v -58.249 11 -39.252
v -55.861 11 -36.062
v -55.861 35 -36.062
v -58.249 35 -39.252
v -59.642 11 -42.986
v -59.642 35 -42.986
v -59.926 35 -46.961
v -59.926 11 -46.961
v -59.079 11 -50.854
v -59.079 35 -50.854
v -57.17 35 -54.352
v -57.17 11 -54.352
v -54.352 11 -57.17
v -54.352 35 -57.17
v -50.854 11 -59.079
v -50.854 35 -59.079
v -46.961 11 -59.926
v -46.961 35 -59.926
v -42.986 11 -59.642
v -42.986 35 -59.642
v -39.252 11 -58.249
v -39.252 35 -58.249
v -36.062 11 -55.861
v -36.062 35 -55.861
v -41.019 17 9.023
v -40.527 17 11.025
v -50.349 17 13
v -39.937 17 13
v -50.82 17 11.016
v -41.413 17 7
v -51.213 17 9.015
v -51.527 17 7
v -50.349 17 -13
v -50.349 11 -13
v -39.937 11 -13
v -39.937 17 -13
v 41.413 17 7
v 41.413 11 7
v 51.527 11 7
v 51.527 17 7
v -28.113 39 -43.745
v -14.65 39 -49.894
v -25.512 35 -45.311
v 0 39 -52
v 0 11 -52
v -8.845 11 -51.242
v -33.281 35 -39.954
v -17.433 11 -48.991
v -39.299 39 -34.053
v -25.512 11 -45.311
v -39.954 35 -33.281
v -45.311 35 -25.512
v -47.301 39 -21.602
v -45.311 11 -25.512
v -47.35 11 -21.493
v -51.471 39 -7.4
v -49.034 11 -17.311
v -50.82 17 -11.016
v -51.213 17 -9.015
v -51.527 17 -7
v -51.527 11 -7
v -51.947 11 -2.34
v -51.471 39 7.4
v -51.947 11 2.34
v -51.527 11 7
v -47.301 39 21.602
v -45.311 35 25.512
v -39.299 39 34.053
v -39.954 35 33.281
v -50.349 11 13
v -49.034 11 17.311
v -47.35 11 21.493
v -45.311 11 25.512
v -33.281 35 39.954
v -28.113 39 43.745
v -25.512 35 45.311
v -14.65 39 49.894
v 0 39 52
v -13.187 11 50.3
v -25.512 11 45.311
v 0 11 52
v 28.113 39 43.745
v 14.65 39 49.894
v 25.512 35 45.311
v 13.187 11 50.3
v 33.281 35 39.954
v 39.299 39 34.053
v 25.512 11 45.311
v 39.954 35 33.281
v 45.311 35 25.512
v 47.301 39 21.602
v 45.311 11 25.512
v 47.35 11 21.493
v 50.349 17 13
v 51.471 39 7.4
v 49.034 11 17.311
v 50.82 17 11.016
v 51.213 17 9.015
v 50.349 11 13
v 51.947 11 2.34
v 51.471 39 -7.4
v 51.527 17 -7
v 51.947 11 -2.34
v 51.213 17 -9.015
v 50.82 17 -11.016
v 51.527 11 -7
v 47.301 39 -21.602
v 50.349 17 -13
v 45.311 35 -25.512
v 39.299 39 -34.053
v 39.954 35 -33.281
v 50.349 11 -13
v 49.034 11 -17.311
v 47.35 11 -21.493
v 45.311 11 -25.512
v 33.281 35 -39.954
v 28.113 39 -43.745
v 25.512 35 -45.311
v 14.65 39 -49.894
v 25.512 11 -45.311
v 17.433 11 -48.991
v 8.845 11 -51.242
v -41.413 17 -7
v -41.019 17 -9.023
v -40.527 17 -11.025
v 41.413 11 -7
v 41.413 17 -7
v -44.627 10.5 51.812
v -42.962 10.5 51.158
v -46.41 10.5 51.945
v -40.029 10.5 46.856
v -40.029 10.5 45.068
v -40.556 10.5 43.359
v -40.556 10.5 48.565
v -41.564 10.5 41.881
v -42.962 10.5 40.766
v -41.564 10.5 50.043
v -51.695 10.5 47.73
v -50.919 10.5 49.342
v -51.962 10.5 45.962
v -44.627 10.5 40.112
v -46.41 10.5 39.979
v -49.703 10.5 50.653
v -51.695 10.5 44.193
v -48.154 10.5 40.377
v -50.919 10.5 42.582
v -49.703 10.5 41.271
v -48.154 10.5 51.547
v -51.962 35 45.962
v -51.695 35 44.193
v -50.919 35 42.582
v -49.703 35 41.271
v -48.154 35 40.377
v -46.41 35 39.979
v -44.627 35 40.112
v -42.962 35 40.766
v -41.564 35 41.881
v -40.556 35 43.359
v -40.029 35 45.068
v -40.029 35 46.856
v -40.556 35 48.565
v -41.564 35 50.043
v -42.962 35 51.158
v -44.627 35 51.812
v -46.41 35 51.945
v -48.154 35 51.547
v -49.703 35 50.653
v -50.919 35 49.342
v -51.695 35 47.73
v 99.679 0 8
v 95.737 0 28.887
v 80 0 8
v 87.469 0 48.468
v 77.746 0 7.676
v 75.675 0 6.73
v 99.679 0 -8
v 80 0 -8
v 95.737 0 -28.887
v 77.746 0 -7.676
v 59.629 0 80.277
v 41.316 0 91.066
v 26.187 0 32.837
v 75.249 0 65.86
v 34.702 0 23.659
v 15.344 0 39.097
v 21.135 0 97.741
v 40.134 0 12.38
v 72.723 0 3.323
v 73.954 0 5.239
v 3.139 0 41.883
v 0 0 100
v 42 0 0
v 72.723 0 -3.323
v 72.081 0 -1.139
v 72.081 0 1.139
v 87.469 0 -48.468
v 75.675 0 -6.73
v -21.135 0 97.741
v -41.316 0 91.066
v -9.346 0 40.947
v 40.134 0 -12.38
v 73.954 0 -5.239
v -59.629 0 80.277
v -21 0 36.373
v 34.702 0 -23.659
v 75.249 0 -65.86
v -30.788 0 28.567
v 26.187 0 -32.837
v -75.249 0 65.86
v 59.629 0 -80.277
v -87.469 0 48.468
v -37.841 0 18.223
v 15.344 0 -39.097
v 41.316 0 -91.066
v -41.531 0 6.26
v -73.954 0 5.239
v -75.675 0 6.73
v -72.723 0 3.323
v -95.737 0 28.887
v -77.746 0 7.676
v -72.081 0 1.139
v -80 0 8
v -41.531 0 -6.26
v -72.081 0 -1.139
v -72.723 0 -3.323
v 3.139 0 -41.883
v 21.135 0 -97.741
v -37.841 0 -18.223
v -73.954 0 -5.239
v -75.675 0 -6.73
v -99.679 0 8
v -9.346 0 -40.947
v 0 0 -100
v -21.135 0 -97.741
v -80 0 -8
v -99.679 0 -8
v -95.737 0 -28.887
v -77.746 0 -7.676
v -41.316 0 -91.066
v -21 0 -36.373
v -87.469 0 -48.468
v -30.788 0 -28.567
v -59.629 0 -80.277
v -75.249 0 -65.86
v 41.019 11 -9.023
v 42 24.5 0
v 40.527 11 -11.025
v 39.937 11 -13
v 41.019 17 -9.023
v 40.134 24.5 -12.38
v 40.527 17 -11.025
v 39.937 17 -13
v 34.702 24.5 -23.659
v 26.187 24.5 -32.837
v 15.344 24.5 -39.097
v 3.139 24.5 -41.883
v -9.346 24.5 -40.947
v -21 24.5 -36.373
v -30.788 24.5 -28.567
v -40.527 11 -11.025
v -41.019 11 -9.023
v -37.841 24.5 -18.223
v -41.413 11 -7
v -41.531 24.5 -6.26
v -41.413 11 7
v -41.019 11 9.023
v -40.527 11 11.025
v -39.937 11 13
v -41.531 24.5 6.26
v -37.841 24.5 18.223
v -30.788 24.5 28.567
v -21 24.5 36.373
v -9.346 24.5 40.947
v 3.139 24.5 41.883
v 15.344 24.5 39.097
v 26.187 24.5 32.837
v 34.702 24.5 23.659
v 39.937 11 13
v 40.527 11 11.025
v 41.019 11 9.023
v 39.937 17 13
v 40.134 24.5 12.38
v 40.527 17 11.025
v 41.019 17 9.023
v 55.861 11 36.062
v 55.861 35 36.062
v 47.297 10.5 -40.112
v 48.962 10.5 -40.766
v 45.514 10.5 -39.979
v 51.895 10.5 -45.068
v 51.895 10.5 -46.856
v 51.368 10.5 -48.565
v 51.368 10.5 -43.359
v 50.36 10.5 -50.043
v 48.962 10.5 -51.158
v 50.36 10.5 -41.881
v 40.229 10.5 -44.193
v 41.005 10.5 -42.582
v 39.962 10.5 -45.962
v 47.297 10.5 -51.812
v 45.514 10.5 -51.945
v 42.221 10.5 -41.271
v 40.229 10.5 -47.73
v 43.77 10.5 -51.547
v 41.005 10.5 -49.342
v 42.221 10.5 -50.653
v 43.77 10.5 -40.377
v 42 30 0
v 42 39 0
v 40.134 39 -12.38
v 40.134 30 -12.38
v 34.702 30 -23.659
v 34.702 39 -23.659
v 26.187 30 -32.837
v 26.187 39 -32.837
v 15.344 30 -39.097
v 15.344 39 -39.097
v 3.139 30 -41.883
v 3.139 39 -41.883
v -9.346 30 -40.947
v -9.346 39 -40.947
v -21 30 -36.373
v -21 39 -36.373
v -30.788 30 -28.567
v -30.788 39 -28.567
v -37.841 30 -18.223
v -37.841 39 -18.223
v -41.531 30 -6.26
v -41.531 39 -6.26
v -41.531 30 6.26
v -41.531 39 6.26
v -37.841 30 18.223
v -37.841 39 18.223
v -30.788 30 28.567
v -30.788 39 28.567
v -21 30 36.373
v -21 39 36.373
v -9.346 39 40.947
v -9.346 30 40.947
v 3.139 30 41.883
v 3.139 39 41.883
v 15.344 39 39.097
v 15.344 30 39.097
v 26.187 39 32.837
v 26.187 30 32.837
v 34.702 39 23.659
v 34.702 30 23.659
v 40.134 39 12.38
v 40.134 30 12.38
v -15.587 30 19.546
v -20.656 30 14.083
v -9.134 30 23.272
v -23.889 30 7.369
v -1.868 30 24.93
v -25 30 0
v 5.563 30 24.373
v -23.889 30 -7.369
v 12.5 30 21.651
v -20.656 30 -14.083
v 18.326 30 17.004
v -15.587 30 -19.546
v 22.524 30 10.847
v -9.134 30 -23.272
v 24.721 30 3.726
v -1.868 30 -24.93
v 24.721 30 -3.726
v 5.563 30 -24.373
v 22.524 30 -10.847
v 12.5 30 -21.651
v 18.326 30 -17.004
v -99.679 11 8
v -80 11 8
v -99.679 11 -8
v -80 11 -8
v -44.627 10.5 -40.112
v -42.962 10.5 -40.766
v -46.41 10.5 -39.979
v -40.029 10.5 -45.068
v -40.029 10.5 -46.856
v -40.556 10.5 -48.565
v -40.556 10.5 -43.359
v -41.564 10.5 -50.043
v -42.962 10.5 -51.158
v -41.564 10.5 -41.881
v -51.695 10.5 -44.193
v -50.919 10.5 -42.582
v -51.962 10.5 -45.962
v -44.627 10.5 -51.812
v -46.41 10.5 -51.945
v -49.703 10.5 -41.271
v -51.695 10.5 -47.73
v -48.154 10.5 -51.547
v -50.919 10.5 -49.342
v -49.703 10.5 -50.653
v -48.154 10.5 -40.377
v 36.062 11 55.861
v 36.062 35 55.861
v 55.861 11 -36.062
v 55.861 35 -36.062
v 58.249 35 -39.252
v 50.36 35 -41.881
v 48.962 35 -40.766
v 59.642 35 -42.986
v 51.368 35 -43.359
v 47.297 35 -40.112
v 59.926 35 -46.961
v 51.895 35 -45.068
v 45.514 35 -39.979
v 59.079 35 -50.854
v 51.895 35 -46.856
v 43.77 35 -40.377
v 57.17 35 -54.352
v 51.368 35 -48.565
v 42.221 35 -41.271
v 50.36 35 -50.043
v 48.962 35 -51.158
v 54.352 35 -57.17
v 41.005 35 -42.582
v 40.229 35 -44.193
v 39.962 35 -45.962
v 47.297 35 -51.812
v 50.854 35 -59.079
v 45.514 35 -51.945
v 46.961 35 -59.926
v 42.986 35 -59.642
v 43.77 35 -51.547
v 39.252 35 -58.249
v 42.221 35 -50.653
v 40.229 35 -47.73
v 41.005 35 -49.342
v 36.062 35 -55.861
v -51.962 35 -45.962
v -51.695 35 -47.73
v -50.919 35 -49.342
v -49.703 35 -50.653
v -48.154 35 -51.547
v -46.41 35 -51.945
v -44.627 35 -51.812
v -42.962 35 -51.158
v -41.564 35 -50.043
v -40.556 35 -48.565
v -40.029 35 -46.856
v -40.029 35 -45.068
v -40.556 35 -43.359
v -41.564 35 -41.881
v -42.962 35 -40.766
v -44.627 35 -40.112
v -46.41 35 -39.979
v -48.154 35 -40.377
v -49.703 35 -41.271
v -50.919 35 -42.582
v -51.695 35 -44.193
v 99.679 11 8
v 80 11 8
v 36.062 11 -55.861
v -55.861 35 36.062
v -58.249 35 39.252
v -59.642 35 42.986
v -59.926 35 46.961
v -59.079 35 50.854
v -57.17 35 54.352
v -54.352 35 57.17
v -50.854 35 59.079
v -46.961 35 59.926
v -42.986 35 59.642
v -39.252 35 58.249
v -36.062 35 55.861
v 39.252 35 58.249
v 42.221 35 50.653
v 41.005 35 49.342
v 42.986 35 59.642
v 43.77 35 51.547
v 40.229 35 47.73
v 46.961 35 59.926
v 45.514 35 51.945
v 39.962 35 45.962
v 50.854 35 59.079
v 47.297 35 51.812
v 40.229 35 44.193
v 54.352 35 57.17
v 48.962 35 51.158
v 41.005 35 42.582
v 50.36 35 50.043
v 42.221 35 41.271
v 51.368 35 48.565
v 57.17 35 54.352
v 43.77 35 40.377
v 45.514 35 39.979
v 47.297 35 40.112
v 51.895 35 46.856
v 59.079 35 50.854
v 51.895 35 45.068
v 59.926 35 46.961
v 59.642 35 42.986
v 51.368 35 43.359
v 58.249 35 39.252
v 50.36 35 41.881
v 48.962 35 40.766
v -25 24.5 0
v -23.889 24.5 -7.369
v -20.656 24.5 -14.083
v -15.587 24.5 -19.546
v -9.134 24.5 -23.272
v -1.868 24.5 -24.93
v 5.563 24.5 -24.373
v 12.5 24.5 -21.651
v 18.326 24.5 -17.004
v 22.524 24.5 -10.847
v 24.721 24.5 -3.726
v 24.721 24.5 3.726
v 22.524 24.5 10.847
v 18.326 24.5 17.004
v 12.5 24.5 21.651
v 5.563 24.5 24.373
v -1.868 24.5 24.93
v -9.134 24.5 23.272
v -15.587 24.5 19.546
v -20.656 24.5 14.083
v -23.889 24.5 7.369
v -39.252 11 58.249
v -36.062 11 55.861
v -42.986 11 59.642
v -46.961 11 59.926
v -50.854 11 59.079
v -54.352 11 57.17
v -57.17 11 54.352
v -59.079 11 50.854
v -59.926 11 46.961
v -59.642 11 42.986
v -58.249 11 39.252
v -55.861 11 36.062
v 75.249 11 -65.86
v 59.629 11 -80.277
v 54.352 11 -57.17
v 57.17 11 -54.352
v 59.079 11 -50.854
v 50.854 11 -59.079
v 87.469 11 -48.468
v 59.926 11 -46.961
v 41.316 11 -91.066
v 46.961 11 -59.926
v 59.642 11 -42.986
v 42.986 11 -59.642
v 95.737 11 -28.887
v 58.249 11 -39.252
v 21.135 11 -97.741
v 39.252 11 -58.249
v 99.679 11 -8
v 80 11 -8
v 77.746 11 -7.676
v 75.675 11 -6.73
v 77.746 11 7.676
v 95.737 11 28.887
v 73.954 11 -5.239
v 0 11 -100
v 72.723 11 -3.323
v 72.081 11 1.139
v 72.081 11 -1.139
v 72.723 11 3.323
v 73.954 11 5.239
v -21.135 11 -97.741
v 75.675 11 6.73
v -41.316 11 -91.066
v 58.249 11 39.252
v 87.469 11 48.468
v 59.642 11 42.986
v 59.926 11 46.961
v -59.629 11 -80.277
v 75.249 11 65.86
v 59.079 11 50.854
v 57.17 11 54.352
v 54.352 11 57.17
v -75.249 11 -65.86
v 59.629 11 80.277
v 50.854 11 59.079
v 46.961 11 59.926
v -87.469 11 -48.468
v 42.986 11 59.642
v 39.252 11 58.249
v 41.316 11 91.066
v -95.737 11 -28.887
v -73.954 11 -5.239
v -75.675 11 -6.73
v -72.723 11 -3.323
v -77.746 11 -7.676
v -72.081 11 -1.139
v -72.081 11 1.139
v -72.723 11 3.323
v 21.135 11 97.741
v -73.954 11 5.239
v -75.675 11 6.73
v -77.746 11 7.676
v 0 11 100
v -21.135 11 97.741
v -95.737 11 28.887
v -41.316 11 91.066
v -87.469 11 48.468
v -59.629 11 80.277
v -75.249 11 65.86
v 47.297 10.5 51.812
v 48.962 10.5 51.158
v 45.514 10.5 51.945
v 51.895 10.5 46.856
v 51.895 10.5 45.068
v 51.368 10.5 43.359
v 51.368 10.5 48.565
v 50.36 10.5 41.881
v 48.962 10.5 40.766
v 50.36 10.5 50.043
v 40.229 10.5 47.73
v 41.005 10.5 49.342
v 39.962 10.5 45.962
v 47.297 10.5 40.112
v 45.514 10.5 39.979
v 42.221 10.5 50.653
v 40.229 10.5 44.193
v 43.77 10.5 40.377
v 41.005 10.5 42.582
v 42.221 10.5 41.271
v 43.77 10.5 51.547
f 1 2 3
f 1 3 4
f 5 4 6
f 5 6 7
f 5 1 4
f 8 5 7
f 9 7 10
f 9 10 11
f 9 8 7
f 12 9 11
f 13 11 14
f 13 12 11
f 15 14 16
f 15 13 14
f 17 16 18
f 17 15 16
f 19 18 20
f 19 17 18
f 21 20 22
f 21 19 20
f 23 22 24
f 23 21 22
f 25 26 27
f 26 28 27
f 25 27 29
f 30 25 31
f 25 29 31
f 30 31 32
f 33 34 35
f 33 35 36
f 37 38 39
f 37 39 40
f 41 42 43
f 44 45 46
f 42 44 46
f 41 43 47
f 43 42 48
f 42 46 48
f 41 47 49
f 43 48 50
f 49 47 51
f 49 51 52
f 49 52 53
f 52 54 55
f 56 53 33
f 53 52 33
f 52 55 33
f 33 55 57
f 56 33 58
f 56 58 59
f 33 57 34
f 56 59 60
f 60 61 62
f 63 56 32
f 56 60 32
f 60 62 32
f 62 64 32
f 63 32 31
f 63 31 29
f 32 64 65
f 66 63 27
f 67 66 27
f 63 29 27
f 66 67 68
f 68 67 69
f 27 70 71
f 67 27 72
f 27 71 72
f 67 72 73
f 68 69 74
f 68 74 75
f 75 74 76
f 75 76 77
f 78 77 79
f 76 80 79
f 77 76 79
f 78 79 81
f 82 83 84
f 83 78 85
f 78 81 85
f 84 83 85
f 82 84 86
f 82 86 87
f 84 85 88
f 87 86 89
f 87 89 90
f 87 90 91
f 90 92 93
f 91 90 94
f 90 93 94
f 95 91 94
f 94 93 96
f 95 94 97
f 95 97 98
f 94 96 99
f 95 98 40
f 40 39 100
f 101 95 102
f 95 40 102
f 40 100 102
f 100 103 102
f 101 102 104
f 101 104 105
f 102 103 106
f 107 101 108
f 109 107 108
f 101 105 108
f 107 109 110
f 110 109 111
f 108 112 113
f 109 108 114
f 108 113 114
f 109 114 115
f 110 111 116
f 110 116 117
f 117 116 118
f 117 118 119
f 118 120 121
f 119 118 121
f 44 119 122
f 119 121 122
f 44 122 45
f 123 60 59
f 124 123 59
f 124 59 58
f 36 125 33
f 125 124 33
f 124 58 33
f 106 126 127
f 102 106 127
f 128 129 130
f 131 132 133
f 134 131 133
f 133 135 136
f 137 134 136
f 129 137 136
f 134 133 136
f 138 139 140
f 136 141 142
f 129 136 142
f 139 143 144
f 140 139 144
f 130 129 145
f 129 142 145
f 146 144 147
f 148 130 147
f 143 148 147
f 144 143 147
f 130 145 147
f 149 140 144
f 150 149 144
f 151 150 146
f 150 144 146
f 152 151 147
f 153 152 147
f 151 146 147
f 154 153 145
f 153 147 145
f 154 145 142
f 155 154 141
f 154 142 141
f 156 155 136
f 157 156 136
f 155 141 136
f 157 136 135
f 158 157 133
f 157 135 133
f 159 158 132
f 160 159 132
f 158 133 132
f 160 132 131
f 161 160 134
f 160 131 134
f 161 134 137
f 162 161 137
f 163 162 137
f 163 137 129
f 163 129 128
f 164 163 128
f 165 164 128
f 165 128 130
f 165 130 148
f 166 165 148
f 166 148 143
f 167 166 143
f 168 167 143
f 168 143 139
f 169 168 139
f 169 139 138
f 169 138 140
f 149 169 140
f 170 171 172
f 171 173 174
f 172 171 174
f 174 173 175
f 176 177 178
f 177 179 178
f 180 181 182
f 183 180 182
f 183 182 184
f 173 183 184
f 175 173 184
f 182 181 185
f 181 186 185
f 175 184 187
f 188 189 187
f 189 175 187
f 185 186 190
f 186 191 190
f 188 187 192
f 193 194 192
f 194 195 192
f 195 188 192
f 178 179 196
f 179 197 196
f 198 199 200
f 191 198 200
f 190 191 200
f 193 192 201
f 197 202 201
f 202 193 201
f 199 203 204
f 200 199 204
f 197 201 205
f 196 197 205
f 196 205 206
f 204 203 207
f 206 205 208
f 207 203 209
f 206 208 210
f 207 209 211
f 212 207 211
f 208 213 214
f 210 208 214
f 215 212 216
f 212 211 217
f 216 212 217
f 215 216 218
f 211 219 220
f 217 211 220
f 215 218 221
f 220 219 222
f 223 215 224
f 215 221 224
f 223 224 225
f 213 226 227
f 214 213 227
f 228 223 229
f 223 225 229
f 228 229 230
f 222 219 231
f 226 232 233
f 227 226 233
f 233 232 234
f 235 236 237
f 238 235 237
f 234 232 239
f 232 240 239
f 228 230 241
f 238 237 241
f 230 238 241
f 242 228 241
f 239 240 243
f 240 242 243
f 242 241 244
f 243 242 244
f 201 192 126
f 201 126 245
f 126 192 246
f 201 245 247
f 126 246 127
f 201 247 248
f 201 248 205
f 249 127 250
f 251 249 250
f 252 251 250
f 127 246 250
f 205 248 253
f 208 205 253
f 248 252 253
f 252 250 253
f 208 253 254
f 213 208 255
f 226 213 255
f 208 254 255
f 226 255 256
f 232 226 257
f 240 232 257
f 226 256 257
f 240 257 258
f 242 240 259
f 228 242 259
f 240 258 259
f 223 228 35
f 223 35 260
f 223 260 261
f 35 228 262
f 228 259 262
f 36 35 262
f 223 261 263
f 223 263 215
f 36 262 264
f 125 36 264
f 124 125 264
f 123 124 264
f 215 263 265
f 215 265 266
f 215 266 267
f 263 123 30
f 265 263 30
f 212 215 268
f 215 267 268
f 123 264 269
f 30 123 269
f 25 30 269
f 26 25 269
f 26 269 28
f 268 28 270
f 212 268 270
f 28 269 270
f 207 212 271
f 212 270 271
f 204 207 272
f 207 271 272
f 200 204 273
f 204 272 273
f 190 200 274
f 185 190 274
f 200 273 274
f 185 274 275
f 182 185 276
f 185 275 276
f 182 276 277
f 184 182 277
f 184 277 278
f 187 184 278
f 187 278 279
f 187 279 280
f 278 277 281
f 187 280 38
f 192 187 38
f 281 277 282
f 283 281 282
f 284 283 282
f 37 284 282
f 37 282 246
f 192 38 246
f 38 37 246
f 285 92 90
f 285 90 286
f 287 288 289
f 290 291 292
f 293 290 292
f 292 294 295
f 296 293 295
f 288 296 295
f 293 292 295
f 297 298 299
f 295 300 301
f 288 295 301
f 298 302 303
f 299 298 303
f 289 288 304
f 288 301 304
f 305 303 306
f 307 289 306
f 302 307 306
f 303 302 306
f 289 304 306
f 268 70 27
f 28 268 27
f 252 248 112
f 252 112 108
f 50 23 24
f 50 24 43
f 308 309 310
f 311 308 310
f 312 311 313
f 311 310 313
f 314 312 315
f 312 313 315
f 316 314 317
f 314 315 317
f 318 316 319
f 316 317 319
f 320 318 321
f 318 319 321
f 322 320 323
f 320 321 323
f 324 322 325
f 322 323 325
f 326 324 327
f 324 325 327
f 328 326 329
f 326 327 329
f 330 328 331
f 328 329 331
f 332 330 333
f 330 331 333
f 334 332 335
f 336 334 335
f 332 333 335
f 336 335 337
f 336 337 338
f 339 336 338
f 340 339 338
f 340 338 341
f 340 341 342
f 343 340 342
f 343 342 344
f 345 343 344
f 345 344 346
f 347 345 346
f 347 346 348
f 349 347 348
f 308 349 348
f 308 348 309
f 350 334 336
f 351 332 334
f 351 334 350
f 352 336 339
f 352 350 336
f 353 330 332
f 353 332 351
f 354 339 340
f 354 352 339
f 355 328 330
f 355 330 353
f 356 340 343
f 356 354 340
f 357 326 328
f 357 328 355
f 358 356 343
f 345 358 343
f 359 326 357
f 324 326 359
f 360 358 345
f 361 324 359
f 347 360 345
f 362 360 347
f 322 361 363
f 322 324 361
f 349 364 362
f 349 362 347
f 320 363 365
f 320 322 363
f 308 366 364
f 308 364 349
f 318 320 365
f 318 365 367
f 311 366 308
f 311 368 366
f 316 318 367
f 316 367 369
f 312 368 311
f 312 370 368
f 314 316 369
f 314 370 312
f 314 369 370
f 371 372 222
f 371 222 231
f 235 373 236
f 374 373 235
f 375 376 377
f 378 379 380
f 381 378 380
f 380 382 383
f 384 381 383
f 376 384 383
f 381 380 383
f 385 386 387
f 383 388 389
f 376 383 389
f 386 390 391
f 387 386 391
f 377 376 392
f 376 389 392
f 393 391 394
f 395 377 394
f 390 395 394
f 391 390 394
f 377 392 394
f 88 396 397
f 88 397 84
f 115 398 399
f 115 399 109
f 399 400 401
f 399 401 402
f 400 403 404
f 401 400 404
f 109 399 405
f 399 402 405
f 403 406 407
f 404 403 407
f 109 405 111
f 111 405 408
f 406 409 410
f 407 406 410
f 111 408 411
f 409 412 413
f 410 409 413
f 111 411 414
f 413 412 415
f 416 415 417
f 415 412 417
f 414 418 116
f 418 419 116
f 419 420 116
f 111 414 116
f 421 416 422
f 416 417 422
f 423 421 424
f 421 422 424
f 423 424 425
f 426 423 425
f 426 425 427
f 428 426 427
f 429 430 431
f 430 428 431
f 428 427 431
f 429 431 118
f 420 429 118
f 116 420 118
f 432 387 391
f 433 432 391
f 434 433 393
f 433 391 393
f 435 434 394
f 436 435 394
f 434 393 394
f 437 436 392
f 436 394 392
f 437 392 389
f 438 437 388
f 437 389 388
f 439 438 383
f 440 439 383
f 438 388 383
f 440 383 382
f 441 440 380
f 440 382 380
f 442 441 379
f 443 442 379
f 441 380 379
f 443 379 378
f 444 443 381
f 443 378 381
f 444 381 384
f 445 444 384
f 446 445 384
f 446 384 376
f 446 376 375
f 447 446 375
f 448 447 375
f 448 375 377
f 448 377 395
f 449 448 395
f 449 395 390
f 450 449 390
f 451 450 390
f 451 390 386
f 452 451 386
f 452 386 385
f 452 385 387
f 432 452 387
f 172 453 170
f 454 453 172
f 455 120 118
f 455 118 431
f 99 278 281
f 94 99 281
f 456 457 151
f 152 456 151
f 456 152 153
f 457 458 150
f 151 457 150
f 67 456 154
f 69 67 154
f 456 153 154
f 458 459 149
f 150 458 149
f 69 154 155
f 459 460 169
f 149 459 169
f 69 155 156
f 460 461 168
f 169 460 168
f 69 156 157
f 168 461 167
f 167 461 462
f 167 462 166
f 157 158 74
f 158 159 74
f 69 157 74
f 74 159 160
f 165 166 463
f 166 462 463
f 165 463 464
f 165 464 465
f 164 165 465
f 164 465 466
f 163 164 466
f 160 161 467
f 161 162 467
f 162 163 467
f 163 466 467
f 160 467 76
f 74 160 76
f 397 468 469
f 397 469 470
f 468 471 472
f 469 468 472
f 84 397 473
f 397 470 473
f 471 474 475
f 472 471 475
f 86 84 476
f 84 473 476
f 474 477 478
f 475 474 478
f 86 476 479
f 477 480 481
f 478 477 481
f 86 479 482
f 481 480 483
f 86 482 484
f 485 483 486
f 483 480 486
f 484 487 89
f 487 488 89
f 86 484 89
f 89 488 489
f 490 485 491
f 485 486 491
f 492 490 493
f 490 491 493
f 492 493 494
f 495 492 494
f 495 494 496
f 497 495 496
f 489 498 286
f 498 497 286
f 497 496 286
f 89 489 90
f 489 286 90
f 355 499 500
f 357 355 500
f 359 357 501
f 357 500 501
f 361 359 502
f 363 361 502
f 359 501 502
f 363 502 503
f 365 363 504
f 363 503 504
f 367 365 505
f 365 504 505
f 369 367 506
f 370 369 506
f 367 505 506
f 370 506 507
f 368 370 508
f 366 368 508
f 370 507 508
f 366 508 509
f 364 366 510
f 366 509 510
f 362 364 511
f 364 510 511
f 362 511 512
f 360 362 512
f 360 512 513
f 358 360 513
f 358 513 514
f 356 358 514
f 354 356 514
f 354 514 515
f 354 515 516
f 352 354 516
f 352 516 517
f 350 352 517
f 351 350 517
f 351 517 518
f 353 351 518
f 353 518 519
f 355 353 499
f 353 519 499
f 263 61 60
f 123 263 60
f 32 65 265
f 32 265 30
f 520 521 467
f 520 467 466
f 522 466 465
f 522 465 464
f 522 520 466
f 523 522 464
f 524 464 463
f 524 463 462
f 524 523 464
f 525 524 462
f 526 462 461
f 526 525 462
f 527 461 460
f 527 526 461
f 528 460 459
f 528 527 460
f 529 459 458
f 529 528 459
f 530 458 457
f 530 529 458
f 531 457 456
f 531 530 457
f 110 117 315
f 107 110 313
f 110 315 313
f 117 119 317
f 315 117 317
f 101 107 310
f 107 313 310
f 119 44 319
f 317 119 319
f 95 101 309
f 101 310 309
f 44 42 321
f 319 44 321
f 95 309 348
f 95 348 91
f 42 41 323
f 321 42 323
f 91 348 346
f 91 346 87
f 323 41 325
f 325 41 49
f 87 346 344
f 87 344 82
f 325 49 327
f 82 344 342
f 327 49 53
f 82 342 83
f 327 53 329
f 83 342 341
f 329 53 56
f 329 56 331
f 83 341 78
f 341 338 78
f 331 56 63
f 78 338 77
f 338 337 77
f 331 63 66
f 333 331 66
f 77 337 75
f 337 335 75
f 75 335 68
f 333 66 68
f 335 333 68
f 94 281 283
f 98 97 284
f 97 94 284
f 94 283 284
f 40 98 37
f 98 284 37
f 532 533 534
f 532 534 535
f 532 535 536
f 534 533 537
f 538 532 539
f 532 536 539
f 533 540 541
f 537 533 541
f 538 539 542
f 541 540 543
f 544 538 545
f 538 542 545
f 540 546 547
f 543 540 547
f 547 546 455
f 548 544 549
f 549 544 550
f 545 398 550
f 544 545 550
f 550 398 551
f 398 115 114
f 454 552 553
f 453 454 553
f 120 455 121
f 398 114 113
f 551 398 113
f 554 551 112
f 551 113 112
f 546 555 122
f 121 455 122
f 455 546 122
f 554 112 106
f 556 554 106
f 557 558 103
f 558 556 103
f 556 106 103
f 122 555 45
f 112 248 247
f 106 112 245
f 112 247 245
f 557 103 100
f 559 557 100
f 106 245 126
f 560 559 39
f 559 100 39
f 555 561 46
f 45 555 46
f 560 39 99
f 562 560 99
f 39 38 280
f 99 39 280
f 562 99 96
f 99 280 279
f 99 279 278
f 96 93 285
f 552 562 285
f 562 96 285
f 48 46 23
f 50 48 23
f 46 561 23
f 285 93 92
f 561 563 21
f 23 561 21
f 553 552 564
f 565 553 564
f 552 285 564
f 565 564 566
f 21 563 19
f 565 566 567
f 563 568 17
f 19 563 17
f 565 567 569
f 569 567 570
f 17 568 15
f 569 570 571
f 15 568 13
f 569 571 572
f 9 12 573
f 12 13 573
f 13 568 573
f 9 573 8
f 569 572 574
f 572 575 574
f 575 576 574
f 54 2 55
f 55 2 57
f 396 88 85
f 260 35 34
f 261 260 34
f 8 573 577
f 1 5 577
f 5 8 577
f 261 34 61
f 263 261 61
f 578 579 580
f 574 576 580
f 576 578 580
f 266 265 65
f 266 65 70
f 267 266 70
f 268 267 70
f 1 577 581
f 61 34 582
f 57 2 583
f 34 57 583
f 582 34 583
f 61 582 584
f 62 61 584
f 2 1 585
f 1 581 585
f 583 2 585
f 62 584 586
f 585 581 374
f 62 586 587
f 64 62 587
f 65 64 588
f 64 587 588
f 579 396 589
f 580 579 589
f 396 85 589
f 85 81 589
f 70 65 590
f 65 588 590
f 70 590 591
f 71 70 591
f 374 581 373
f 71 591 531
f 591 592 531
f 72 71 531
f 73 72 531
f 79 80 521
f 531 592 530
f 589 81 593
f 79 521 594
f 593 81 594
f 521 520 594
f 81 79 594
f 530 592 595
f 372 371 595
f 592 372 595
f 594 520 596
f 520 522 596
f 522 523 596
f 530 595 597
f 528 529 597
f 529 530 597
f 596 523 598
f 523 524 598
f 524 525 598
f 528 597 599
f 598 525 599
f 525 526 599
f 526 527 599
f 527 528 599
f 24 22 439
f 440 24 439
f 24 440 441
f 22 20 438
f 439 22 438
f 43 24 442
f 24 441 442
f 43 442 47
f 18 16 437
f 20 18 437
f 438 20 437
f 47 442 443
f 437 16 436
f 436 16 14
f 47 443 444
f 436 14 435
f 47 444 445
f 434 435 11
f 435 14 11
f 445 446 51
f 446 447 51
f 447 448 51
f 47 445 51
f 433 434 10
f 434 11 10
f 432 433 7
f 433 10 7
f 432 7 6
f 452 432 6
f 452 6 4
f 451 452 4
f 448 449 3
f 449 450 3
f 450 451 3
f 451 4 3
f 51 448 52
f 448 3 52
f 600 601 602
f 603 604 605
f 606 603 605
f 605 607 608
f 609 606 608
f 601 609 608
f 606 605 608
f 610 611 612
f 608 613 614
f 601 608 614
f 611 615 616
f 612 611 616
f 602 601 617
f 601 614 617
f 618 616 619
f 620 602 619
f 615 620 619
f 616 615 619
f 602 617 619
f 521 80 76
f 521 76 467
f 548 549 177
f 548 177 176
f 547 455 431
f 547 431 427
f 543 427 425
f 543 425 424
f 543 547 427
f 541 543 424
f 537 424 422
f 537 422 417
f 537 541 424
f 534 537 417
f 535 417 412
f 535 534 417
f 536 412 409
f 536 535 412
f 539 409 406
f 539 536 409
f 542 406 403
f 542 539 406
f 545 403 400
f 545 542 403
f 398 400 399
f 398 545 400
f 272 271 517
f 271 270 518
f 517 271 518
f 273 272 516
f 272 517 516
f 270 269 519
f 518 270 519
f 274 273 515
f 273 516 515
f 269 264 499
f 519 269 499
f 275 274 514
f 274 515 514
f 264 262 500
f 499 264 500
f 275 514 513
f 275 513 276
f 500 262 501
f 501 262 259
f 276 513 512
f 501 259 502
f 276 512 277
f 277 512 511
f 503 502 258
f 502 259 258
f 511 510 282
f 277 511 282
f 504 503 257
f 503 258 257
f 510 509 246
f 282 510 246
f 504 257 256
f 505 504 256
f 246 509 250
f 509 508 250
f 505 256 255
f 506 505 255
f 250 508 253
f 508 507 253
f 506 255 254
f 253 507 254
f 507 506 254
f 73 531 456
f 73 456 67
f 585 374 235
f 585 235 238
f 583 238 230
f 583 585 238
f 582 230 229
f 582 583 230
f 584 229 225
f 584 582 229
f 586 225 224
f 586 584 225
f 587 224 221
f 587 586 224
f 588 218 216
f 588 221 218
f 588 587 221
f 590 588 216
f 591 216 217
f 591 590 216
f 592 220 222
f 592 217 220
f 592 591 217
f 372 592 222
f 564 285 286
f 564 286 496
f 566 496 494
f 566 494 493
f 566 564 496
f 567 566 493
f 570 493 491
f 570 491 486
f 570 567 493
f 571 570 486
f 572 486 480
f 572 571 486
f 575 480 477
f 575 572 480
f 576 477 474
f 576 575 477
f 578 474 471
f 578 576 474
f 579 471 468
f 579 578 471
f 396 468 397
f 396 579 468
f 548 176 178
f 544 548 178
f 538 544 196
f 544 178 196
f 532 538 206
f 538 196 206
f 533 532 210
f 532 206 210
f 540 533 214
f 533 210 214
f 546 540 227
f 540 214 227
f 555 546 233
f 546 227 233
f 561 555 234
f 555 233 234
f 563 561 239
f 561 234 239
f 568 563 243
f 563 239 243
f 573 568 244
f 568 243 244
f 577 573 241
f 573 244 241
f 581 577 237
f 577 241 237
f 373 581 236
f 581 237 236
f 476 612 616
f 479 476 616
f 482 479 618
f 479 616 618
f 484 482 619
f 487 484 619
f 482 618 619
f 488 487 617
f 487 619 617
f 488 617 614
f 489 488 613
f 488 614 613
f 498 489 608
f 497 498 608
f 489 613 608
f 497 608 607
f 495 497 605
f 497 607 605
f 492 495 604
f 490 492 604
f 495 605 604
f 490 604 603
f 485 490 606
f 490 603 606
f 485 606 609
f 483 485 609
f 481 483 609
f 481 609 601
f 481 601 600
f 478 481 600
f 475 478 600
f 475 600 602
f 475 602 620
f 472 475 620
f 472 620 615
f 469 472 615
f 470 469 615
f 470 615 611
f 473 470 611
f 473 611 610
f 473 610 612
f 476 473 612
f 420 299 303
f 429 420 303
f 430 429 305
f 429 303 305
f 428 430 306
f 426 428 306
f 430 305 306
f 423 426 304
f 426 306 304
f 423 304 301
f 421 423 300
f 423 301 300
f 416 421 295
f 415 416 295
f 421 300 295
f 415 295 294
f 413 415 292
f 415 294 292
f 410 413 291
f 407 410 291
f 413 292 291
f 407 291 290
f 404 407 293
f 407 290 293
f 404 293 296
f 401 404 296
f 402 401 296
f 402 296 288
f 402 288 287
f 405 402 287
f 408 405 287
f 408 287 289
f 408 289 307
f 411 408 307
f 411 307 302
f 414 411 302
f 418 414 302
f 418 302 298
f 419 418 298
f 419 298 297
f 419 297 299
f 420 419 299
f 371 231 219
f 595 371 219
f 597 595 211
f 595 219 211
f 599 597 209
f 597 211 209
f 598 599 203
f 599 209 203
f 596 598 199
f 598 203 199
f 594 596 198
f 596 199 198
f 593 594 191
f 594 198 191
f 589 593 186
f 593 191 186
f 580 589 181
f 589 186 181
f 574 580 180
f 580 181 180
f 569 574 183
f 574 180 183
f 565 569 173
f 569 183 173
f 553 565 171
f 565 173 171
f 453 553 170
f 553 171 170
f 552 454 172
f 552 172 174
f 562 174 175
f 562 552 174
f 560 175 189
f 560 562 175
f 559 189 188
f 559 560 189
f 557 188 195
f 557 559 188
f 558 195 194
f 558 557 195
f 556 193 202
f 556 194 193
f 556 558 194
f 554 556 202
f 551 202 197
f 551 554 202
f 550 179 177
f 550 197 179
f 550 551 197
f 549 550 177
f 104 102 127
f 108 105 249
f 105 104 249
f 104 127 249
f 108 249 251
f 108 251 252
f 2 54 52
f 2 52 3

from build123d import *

# Parameters (mm, degrees)
HOLE1_D                 = 50
HOLE1_CBORE_D           = 84
HOLE1_CBORE_DEPTH       = 9
HOLE2_D                 = 84
HOLE2_DEPTH             = 24.5
BOSS_EXTRUDE1_DEPTH     = 24
CIRPATTERN1_COUNT       = 4
HOLE3_D                 = 12
HOLE3_DEPTH             = 24.5
CUT_EXTRUDE2_DEPTH      = 24
CIRPATTERN2_COUNT       = 2
CUT_EXTRUDE3_DEPTH      = 147.482080815
CUT_EXTRUDE3_DEPTH_BACK = 147.482080815
SKETCH12_W              = 6
SKETCH12_H              = 6


with BuildPart() as part:
    # Sketch1 → Revolve1 (revolve)
    with BuildSketch(Plane.XY, mode=Mode.PRIVATE) as revolve1_sk:
        Polygon((0, 0), (0, 39), (-52, 39), (-52, 11), (-100, 11), (-100, 0), align=None)
    revolve(revolve1_sk.sketch.rotate(Axis((0, 0, 0), (0, 1, 0)), 270), axis=Axis((0, 0, 0), (0, 1, 0)))

    # Hole1 (through all)
    with Locations(Plane(origin=(0, 39, 0), x_dir=(1, 0, 0), z_dir=(0, 1, 0))):
        with Locations((0, 0)):
            CounterBoreHole(HOLE1_D / 2, HOLE1_CBORE_D / 2, HOLE1_CBORE_DEPTH)

    # Hole2
    with Locations(Plane(origin=(0, 0, 0), x_dir=(-1, 0, 0), z_dir=(0, -1, 0))):
        with Locations((0, 0)):
            Hole(HOLE2_D / 2, depth=HOLE2_DEPTH)

    # Sketch8 → Boss-Extrude1 (add)
    with BuildSketch(Plane(origin=(0, 11, 0), x_dir=(1, 0, 0), z_dir=(0, 1, 0))):
        with BuildLine():
            Line((25.512367483, 45.311357356), (36.062445841, 55.861435714))
            ThreePointArc((36.062445841, 55.861435714), (55.861435714, 55.861435714), (55.861435714, 36.062445841))
            Line((55.861435714, 36.062445841), (45.311357356, 25.512367483))
            ThreePointArc((45.311357356, 25.512367483), (36.769552622, 36.769552622), (25.512367483, 45.311357356))
        make_face()
    boss_extrude1 = extrude(amount=BOSS_EXTRUDE1_DEPTH)

    # CirPattern1: Boss-Extrude1 ×4 about axis
    cirpattern1_axis = Axis((0, 0, 0), (0, 1, 0))
    for i in range(1, CIRPATTERN1_COUNT):
        add(boss_extrude1.rotate(cirpattern1_axis, i * 360 / CIRPATTERN1_COUNT))

    # Hole3
    with Locations(Plane(origin=(0, 35, 0), x_dir=(1, 0, 0), z_dir=(0, 1, 0))):
        with Locations((45.961940777, 45.961940777), (45.961940777, -45.961940777), (-45.961940777, -45.961940777), (-45.961940777, 45.961940777)):
            Hole(HOLE3_D / 2, depth=HOLE3_DEPTH)

    # Sketch11 → Cut-Extrude2 (cut)
    with BuildSketch(Plane(origin=(0, 11, 0), x_dir=(1, 0, 0), z_dir=(0, 1, 0))):
        with BuildLine():
            Line((80, 8), (120, 8))
            ThreePointArc((120, 8), (128, 0), (120, -8))
            Line((120, -8), (80, -8))
            ThreePointArc((80, -8), (72, 0), (80, 8))
        make_face()
    cut_extrude2 = extrude(amount=-CUT_EXTRUDE2_DEPTH, mode=Mode.SUBTRACT)

    # CirPattern2: Cut-Extrude2 ×2 about axis
    cirpattern2_axis = Axis((0, 0, 0), (0, 1, 0))
    for i in range(1, CIRPATTERN2_COUNT):
        add(cut_extrude2.rotate(cirpattern2_axis, i * 360 / CIRPATTERN2_COUNT), mode=Mode.SUBTRACT)

    # Sketch12 → Cut-Extrude3 (cut, two sides: drawn at the far end of the back side and taken through both)
    with BuildSketch(Plane(origin=(0, 0, 0), x_dir=(0, 0, -1), z_dir=(1, 0, 0)).offset(-CUT_EXTRUDE3_DEPTH_BACK)):
        with Locations((-10, 14)):
            Rectangle(SKETCH12_W, SKETCH12_H)
        with Locations((10, 14)):
            Rectangle(SKETCH12_W, SKETCH12_H)
    extrude(amount=CUT_EXTRUDE3_DEPTH + CUT_EXTRUDE3_DEPTH_BACK, mode=Mode.SUBTRACT)


solid = part.part
